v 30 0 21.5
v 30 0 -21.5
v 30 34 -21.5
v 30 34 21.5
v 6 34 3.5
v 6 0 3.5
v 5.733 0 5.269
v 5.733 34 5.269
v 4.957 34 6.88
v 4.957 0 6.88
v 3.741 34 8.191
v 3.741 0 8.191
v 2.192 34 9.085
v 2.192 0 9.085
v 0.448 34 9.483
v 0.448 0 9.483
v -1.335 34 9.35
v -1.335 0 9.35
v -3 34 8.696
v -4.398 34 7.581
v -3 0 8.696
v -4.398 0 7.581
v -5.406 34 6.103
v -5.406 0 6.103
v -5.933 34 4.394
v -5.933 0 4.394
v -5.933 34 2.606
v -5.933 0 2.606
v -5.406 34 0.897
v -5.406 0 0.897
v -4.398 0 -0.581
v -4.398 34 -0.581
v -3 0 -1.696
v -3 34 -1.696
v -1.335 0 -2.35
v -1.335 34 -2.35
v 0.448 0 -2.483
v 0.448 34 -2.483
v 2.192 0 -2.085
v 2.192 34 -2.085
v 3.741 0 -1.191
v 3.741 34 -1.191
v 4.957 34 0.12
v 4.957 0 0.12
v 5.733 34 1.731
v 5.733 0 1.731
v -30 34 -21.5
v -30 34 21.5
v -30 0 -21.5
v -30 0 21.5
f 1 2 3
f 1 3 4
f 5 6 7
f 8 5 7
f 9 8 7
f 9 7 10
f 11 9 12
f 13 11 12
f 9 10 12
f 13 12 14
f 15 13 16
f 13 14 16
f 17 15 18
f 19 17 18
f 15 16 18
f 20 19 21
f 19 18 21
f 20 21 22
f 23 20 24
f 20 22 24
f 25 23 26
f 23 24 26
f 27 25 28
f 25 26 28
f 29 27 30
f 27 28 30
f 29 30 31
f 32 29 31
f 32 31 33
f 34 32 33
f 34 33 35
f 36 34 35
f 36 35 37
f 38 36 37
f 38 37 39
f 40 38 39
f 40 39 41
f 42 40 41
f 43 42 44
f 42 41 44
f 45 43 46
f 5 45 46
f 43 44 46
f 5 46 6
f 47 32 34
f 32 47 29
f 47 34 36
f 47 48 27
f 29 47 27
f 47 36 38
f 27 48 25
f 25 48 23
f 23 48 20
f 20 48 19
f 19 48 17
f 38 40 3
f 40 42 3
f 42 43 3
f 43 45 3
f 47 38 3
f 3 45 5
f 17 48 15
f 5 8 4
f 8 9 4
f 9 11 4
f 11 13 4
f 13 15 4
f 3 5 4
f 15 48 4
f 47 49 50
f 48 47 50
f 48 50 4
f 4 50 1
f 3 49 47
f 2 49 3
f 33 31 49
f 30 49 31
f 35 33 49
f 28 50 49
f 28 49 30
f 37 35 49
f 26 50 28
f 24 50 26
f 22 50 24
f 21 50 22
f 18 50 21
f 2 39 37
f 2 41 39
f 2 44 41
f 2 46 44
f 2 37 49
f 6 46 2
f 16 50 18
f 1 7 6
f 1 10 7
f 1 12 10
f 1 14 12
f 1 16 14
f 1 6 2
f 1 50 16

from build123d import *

# Parameters (mm, degrees)
F0_W     = 60
F0_H     = 43
F0_R     = 6
F1_DEPTH = 34


with BuildPart() as f1:
    # F0 (on Front) → F1 (new body)
    with BuildSketch(Plane.XZ):
        Rectangle(F0_W, F0_H)
        with Locations((0, 3.5)):
            Circle(F0_R, mode=Mode.SUBTRACT)
    extrude(amount=-F1_DEPTH)


solid = f1.part
